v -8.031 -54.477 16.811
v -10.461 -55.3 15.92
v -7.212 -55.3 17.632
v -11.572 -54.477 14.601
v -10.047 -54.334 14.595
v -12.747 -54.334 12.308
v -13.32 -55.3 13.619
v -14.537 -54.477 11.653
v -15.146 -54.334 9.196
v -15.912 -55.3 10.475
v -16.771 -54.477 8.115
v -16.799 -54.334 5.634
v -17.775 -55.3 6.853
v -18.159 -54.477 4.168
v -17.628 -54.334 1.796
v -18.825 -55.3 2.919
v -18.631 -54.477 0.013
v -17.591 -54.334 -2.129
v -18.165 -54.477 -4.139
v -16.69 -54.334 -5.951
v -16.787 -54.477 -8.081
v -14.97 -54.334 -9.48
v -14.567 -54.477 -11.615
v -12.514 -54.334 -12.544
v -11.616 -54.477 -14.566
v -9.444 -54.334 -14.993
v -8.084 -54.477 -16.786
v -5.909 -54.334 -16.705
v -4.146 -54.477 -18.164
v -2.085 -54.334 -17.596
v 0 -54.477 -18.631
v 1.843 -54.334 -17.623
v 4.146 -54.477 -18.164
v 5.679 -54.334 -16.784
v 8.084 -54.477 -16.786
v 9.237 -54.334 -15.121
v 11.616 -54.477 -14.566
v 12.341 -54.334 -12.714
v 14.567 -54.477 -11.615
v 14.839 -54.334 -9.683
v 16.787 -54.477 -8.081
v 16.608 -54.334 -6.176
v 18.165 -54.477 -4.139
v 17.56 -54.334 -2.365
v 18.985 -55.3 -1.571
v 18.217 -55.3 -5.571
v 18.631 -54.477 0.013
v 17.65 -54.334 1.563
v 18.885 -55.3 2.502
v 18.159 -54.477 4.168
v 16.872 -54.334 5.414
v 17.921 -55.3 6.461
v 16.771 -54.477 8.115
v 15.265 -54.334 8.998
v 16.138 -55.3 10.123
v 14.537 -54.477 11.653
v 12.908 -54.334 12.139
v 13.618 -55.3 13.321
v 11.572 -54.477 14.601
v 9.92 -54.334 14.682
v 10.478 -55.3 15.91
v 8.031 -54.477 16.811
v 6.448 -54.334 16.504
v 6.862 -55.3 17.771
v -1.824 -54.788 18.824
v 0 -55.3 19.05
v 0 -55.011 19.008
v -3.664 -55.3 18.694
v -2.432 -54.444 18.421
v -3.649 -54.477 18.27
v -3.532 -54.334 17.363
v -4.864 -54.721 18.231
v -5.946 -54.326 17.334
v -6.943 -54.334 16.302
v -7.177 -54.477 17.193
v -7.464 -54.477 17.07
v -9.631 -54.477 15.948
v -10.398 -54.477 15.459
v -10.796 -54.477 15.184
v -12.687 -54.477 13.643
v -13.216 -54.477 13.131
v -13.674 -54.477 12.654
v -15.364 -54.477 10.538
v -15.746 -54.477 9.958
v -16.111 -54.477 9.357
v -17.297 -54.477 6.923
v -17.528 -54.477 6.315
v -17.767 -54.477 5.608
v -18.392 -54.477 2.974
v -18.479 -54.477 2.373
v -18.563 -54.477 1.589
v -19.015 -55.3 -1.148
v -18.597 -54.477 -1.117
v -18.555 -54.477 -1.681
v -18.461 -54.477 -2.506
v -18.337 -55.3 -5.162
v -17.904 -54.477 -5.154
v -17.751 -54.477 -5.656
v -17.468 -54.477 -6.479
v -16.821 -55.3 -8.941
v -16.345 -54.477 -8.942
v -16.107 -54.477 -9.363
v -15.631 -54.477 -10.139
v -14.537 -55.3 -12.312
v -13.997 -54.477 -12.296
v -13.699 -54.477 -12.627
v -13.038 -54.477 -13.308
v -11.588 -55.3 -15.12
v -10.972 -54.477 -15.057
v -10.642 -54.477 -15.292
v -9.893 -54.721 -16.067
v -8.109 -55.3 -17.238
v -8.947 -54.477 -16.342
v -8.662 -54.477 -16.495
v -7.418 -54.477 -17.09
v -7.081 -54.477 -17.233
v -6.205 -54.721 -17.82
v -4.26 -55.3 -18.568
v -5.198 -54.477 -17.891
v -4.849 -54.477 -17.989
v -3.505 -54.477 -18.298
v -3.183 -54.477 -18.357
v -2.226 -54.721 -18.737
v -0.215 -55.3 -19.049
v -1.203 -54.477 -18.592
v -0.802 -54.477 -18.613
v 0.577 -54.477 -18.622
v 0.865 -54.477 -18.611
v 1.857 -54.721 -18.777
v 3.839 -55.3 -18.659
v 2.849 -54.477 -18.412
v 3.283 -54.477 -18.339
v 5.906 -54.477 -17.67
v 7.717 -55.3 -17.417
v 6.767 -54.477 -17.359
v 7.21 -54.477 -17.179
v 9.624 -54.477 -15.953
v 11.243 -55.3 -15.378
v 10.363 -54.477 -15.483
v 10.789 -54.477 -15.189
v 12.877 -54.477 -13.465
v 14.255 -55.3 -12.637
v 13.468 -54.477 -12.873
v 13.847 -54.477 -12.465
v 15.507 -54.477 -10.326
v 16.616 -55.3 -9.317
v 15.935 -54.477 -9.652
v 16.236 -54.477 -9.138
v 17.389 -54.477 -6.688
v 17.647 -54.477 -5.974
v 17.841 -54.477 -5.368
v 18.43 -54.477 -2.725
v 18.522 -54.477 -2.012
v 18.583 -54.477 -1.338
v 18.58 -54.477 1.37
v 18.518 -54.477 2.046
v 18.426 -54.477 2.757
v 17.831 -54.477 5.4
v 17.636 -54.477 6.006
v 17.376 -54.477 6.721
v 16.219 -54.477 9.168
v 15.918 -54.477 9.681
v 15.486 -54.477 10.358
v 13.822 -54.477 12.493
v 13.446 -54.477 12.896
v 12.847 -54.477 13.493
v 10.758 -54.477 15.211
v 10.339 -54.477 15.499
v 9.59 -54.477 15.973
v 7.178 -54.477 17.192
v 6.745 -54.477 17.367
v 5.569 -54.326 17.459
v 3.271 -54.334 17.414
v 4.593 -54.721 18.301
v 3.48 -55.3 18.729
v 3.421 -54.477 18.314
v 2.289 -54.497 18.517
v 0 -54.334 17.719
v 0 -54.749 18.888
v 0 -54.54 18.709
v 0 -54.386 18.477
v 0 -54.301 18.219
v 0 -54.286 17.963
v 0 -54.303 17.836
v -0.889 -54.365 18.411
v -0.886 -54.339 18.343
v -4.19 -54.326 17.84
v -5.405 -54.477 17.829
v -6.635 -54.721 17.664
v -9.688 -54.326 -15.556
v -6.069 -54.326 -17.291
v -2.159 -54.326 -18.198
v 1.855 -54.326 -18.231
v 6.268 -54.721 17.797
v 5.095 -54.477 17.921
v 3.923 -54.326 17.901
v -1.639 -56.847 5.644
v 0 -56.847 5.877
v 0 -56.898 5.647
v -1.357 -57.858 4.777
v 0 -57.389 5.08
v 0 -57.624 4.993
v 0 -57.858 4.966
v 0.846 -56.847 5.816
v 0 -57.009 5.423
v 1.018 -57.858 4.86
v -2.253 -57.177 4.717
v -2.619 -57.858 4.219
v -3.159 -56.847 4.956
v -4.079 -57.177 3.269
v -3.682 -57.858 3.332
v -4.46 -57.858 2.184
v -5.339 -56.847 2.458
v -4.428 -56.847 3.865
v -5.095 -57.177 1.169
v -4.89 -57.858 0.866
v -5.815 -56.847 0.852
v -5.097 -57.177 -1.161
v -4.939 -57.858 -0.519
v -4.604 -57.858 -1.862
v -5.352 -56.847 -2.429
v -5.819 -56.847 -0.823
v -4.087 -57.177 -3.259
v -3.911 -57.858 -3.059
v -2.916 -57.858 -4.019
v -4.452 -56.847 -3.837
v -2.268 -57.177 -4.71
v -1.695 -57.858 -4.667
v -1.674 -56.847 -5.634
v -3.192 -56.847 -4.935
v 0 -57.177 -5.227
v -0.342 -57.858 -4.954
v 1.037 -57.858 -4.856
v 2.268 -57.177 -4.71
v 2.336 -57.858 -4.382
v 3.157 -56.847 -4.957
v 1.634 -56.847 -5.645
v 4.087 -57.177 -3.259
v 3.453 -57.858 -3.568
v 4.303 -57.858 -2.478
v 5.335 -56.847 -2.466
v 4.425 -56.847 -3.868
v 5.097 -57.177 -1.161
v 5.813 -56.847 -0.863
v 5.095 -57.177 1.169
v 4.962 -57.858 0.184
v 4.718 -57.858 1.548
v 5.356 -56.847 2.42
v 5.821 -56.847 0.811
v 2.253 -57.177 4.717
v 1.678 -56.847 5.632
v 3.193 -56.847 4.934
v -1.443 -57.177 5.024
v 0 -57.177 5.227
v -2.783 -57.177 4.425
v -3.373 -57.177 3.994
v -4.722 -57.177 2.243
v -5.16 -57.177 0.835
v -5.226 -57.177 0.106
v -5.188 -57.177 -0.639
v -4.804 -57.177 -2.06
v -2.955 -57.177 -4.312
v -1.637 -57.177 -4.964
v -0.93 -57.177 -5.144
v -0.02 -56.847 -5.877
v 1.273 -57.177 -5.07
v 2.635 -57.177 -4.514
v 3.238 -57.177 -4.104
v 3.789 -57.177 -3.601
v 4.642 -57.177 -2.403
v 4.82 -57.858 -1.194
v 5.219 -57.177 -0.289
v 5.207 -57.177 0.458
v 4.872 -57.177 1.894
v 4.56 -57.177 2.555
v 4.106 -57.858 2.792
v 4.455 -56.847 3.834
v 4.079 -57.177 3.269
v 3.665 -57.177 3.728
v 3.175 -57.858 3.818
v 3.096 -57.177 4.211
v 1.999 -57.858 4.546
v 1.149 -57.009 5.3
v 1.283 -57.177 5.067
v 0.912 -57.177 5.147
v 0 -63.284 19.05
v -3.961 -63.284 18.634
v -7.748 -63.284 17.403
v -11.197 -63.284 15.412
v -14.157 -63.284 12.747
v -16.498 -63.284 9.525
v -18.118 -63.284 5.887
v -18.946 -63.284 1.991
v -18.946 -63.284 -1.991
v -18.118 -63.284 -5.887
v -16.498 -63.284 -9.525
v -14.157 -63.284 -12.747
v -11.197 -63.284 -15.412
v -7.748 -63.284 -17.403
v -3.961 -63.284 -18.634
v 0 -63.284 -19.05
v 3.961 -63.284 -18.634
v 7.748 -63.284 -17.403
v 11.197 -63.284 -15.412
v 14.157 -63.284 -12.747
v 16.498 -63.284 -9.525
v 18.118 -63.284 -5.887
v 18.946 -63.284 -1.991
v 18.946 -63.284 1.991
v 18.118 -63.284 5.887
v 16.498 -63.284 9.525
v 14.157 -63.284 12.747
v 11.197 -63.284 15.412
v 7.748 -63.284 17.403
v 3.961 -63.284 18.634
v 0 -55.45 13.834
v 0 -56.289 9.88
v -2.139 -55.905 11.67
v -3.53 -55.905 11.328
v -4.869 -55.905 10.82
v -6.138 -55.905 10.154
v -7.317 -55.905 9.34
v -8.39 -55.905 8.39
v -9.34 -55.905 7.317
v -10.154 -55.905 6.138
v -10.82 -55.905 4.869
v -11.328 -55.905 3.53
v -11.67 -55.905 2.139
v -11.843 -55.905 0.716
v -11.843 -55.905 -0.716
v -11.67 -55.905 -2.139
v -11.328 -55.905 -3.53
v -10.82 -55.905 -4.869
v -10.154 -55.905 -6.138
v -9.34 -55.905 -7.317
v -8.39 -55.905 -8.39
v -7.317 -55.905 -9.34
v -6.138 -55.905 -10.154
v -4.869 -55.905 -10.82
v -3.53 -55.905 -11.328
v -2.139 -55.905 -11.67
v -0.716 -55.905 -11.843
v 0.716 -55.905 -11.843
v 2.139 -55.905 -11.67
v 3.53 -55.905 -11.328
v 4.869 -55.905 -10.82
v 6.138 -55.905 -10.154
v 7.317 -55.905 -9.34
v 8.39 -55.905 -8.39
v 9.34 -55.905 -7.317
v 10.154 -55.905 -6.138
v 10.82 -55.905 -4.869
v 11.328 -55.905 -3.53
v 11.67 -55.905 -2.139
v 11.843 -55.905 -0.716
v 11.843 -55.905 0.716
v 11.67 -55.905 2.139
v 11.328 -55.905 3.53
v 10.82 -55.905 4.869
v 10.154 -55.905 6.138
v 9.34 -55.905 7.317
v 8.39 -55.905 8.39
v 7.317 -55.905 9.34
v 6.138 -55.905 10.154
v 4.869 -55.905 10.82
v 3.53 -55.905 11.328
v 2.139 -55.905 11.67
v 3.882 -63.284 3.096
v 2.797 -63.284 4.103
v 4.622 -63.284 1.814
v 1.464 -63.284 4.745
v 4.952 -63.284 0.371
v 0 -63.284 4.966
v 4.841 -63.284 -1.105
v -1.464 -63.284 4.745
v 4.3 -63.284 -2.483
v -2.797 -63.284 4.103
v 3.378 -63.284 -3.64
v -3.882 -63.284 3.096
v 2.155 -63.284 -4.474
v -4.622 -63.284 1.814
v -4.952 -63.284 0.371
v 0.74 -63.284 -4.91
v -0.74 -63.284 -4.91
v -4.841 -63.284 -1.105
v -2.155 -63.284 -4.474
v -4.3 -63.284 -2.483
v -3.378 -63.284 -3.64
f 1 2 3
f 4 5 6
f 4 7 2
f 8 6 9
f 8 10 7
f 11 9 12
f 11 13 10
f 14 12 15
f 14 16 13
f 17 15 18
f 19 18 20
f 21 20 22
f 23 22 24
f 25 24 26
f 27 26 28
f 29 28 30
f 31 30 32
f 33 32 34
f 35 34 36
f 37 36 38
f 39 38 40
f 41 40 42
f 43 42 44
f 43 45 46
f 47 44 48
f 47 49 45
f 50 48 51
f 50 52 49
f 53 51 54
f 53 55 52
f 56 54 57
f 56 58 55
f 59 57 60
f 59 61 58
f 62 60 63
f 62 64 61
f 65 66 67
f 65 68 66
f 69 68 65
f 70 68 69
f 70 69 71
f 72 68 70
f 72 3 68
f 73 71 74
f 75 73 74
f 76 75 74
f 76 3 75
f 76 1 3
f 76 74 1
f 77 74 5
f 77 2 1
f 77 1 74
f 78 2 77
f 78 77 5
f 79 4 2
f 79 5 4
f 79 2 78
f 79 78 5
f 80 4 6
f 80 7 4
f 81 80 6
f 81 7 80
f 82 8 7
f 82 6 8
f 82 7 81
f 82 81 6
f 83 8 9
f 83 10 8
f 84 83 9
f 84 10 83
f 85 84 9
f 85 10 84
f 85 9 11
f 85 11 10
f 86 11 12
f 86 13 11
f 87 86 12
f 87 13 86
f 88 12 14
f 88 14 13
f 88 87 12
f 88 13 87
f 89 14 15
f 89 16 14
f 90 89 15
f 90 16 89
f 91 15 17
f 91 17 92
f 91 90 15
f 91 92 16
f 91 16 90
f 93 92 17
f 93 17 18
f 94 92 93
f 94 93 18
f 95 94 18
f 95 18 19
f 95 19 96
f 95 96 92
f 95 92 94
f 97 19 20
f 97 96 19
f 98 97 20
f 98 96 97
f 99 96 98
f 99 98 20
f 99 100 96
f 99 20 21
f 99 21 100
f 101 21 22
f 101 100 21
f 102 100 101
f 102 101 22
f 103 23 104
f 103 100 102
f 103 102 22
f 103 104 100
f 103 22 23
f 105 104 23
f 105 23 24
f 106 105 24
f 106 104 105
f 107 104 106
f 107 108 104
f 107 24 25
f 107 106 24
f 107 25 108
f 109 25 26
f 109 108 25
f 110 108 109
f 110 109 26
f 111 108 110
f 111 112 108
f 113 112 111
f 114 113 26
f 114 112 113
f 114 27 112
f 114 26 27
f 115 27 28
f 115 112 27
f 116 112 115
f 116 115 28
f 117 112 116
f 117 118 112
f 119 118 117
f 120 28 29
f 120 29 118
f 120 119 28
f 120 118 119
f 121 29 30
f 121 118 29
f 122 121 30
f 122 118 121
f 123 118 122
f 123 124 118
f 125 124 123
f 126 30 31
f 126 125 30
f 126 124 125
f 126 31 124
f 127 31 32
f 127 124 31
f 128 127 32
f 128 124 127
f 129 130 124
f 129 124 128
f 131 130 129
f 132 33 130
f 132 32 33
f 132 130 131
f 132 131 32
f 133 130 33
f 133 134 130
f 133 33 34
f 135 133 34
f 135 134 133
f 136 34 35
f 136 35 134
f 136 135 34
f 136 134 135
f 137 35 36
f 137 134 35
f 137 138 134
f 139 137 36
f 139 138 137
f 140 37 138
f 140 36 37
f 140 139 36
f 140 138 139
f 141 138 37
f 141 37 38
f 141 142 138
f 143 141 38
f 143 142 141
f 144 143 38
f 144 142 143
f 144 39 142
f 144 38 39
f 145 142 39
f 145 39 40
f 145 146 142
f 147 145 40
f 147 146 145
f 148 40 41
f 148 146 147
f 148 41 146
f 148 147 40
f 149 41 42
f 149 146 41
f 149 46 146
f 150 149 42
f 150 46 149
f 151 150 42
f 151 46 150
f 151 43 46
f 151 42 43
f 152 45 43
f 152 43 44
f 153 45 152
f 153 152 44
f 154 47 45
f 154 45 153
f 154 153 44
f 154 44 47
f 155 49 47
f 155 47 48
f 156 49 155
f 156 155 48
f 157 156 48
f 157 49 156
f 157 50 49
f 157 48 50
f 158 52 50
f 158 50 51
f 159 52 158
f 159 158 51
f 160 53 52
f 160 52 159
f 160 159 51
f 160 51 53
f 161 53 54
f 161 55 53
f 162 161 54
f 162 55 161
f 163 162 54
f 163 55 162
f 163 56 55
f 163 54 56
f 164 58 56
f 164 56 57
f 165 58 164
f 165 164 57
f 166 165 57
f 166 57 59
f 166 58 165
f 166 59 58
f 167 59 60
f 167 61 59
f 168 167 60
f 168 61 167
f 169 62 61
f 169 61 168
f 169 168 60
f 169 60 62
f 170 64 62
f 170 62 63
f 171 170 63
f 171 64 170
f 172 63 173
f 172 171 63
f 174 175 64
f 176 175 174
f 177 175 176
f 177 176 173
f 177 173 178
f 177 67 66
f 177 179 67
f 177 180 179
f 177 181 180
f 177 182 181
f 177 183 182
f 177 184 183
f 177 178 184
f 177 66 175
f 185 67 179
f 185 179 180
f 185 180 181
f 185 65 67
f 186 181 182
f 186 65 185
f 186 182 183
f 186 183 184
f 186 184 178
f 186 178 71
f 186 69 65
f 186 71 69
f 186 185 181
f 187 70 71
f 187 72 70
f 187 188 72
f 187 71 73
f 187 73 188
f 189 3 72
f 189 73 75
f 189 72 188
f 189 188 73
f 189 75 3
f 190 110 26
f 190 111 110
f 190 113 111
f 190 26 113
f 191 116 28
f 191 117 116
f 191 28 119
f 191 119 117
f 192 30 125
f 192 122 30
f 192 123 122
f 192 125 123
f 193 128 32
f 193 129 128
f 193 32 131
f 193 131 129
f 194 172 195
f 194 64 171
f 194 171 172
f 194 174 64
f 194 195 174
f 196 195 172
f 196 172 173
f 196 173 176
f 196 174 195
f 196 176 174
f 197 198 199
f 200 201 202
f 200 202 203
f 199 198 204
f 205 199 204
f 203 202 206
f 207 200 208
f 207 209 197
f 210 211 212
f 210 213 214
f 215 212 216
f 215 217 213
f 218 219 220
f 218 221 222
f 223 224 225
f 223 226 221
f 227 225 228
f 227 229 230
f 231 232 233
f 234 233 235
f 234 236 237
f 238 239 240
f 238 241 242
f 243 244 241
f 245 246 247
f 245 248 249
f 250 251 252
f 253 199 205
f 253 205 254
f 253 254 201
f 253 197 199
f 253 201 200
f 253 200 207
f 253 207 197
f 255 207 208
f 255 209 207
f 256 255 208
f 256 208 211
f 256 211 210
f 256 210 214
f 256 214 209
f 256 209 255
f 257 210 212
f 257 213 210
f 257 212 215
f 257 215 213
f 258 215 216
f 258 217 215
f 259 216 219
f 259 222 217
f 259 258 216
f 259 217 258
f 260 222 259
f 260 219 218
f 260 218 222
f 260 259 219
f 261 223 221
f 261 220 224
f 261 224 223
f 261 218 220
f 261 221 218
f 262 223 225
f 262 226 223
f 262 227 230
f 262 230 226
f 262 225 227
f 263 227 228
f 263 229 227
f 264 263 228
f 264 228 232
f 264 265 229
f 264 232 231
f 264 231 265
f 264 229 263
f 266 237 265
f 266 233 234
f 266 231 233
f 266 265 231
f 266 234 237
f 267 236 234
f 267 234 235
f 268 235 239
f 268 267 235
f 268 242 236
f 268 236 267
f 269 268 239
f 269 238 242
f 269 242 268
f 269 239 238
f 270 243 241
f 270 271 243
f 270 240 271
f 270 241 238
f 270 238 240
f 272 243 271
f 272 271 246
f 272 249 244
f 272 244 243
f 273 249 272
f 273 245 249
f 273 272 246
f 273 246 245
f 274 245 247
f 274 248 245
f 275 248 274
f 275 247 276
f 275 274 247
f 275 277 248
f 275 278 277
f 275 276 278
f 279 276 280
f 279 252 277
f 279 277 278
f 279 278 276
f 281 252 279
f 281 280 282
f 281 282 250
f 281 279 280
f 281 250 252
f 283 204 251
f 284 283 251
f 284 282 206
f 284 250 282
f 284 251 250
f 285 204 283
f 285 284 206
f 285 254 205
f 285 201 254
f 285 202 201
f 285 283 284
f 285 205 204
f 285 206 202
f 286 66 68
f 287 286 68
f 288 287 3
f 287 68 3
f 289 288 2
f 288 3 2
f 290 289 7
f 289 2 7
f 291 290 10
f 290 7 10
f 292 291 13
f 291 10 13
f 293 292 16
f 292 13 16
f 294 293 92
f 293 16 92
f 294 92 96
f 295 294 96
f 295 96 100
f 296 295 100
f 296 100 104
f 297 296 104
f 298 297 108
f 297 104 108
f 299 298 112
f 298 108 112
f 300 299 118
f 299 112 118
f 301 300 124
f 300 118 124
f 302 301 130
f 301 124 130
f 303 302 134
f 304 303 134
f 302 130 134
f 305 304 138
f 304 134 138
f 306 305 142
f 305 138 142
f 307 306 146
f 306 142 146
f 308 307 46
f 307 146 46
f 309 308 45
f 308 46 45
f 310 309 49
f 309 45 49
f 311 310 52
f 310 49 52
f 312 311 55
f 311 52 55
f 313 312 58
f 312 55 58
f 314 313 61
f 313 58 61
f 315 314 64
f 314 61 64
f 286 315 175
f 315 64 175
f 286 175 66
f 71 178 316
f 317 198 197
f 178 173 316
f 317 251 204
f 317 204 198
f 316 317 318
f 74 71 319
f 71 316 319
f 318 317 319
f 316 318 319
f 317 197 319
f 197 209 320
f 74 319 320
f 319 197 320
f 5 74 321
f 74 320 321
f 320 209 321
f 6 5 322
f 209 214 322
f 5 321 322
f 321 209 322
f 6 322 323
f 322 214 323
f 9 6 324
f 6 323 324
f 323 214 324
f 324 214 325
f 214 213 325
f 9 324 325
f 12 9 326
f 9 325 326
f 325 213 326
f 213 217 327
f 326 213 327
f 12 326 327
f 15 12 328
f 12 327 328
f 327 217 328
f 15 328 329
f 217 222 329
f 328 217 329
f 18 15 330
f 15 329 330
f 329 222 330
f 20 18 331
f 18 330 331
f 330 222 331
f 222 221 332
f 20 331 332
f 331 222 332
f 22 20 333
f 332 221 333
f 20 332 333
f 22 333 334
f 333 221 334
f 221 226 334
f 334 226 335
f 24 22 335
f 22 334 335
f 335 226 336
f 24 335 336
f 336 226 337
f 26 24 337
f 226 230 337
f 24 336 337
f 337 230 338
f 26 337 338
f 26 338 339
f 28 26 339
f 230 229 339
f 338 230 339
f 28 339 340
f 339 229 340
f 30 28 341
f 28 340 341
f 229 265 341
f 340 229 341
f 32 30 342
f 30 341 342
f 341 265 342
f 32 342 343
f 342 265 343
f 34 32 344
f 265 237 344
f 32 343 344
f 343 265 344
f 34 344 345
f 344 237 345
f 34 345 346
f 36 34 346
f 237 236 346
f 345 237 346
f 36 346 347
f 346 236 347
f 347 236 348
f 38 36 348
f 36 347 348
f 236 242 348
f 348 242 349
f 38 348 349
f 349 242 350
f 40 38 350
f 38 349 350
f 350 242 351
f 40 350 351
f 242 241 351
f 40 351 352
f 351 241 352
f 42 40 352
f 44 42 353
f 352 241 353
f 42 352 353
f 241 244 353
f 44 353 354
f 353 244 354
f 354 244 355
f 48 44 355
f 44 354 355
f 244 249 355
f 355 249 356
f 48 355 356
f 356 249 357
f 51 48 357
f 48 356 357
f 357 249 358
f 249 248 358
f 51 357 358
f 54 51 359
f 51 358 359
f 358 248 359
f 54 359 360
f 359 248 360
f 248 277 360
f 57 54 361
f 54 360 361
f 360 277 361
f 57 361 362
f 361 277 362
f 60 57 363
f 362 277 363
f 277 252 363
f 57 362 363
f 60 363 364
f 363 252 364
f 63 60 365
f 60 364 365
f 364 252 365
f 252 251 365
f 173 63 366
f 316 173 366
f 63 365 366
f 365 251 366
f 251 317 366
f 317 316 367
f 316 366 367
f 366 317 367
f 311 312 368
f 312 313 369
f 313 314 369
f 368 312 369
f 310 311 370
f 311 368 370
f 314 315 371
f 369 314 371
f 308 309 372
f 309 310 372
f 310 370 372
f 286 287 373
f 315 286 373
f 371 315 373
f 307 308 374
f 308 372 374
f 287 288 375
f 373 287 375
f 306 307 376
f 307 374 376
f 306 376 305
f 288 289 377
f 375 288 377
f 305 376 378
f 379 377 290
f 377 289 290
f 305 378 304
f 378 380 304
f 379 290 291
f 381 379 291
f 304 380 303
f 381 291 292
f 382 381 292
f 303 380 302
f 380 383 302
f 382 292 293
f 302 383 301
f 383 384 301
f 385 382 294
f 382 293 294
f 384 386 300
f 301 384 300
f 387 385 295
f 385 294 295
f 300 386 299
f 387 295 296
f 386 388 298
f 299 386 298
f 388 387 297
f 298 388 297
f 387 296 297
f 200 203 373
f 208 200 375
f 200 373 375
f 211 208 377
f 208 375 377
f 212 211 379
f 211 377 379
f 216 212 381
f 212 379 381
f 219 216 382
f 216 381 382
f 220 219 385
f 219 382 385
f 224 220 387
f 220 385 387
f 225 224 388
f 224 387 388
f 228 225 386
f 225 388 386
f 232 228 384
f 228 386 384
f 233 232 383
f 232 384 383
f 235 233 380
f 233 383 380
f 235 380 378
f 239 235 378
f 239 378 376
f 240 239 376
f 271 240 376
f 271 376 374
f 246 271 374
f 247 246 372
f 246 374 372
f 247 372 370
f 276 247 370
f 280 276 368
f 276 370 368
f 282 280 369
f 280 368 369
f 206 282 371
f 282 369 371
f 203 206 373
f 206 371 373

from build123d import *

# Parameters (mm, degrees)
FILLET1_R = 1.016
FILLET2_R = 1.016


with BuildPart() as part:
    # Sketch1 → Revolve1 (revolve)
    with BuildSketch(Plane.XY, mode=Mode.PRIVATE) as revolve1_sk:
        with BuildLine():
            Line((4.9657, -63.283859201), (19.05, -63.283859201))
            Line((19.05, -63.283859201), (19.05, -53.881536726))
            ThreePointArc((19.05, -53.881536726), (12.104446693, -55.853423084), (4.9657, -56.933859201))
            Line((4.9657, -56.933859201), (4.9657, -63.283859201))
        make_face()
    revolve(revolve1_sk.sketch.rotate(Axis((0, 0, 0), (0, -1, 0)), 90), axis=Axis((0, 0, 0), (0, -1, 0)))  # turned: the seam where the file's is

    # Fillet1
    fillet1_edges = [part.edges().sort_by_distance(p)[0] for p in [
        (0, -53.881536726, -19.05),
    ]]
    fillet(fillet1_edges, radius=FILLET1_R)

    # Fillet2
    fillet2_edges = [part.edges().sort_by_distance(p)[0] for p in [
        (0, -56.933859201, -4.9657),
    ]]
    fillet(fillet2_edges, radius=FILLET2_R)


solid = part.part
